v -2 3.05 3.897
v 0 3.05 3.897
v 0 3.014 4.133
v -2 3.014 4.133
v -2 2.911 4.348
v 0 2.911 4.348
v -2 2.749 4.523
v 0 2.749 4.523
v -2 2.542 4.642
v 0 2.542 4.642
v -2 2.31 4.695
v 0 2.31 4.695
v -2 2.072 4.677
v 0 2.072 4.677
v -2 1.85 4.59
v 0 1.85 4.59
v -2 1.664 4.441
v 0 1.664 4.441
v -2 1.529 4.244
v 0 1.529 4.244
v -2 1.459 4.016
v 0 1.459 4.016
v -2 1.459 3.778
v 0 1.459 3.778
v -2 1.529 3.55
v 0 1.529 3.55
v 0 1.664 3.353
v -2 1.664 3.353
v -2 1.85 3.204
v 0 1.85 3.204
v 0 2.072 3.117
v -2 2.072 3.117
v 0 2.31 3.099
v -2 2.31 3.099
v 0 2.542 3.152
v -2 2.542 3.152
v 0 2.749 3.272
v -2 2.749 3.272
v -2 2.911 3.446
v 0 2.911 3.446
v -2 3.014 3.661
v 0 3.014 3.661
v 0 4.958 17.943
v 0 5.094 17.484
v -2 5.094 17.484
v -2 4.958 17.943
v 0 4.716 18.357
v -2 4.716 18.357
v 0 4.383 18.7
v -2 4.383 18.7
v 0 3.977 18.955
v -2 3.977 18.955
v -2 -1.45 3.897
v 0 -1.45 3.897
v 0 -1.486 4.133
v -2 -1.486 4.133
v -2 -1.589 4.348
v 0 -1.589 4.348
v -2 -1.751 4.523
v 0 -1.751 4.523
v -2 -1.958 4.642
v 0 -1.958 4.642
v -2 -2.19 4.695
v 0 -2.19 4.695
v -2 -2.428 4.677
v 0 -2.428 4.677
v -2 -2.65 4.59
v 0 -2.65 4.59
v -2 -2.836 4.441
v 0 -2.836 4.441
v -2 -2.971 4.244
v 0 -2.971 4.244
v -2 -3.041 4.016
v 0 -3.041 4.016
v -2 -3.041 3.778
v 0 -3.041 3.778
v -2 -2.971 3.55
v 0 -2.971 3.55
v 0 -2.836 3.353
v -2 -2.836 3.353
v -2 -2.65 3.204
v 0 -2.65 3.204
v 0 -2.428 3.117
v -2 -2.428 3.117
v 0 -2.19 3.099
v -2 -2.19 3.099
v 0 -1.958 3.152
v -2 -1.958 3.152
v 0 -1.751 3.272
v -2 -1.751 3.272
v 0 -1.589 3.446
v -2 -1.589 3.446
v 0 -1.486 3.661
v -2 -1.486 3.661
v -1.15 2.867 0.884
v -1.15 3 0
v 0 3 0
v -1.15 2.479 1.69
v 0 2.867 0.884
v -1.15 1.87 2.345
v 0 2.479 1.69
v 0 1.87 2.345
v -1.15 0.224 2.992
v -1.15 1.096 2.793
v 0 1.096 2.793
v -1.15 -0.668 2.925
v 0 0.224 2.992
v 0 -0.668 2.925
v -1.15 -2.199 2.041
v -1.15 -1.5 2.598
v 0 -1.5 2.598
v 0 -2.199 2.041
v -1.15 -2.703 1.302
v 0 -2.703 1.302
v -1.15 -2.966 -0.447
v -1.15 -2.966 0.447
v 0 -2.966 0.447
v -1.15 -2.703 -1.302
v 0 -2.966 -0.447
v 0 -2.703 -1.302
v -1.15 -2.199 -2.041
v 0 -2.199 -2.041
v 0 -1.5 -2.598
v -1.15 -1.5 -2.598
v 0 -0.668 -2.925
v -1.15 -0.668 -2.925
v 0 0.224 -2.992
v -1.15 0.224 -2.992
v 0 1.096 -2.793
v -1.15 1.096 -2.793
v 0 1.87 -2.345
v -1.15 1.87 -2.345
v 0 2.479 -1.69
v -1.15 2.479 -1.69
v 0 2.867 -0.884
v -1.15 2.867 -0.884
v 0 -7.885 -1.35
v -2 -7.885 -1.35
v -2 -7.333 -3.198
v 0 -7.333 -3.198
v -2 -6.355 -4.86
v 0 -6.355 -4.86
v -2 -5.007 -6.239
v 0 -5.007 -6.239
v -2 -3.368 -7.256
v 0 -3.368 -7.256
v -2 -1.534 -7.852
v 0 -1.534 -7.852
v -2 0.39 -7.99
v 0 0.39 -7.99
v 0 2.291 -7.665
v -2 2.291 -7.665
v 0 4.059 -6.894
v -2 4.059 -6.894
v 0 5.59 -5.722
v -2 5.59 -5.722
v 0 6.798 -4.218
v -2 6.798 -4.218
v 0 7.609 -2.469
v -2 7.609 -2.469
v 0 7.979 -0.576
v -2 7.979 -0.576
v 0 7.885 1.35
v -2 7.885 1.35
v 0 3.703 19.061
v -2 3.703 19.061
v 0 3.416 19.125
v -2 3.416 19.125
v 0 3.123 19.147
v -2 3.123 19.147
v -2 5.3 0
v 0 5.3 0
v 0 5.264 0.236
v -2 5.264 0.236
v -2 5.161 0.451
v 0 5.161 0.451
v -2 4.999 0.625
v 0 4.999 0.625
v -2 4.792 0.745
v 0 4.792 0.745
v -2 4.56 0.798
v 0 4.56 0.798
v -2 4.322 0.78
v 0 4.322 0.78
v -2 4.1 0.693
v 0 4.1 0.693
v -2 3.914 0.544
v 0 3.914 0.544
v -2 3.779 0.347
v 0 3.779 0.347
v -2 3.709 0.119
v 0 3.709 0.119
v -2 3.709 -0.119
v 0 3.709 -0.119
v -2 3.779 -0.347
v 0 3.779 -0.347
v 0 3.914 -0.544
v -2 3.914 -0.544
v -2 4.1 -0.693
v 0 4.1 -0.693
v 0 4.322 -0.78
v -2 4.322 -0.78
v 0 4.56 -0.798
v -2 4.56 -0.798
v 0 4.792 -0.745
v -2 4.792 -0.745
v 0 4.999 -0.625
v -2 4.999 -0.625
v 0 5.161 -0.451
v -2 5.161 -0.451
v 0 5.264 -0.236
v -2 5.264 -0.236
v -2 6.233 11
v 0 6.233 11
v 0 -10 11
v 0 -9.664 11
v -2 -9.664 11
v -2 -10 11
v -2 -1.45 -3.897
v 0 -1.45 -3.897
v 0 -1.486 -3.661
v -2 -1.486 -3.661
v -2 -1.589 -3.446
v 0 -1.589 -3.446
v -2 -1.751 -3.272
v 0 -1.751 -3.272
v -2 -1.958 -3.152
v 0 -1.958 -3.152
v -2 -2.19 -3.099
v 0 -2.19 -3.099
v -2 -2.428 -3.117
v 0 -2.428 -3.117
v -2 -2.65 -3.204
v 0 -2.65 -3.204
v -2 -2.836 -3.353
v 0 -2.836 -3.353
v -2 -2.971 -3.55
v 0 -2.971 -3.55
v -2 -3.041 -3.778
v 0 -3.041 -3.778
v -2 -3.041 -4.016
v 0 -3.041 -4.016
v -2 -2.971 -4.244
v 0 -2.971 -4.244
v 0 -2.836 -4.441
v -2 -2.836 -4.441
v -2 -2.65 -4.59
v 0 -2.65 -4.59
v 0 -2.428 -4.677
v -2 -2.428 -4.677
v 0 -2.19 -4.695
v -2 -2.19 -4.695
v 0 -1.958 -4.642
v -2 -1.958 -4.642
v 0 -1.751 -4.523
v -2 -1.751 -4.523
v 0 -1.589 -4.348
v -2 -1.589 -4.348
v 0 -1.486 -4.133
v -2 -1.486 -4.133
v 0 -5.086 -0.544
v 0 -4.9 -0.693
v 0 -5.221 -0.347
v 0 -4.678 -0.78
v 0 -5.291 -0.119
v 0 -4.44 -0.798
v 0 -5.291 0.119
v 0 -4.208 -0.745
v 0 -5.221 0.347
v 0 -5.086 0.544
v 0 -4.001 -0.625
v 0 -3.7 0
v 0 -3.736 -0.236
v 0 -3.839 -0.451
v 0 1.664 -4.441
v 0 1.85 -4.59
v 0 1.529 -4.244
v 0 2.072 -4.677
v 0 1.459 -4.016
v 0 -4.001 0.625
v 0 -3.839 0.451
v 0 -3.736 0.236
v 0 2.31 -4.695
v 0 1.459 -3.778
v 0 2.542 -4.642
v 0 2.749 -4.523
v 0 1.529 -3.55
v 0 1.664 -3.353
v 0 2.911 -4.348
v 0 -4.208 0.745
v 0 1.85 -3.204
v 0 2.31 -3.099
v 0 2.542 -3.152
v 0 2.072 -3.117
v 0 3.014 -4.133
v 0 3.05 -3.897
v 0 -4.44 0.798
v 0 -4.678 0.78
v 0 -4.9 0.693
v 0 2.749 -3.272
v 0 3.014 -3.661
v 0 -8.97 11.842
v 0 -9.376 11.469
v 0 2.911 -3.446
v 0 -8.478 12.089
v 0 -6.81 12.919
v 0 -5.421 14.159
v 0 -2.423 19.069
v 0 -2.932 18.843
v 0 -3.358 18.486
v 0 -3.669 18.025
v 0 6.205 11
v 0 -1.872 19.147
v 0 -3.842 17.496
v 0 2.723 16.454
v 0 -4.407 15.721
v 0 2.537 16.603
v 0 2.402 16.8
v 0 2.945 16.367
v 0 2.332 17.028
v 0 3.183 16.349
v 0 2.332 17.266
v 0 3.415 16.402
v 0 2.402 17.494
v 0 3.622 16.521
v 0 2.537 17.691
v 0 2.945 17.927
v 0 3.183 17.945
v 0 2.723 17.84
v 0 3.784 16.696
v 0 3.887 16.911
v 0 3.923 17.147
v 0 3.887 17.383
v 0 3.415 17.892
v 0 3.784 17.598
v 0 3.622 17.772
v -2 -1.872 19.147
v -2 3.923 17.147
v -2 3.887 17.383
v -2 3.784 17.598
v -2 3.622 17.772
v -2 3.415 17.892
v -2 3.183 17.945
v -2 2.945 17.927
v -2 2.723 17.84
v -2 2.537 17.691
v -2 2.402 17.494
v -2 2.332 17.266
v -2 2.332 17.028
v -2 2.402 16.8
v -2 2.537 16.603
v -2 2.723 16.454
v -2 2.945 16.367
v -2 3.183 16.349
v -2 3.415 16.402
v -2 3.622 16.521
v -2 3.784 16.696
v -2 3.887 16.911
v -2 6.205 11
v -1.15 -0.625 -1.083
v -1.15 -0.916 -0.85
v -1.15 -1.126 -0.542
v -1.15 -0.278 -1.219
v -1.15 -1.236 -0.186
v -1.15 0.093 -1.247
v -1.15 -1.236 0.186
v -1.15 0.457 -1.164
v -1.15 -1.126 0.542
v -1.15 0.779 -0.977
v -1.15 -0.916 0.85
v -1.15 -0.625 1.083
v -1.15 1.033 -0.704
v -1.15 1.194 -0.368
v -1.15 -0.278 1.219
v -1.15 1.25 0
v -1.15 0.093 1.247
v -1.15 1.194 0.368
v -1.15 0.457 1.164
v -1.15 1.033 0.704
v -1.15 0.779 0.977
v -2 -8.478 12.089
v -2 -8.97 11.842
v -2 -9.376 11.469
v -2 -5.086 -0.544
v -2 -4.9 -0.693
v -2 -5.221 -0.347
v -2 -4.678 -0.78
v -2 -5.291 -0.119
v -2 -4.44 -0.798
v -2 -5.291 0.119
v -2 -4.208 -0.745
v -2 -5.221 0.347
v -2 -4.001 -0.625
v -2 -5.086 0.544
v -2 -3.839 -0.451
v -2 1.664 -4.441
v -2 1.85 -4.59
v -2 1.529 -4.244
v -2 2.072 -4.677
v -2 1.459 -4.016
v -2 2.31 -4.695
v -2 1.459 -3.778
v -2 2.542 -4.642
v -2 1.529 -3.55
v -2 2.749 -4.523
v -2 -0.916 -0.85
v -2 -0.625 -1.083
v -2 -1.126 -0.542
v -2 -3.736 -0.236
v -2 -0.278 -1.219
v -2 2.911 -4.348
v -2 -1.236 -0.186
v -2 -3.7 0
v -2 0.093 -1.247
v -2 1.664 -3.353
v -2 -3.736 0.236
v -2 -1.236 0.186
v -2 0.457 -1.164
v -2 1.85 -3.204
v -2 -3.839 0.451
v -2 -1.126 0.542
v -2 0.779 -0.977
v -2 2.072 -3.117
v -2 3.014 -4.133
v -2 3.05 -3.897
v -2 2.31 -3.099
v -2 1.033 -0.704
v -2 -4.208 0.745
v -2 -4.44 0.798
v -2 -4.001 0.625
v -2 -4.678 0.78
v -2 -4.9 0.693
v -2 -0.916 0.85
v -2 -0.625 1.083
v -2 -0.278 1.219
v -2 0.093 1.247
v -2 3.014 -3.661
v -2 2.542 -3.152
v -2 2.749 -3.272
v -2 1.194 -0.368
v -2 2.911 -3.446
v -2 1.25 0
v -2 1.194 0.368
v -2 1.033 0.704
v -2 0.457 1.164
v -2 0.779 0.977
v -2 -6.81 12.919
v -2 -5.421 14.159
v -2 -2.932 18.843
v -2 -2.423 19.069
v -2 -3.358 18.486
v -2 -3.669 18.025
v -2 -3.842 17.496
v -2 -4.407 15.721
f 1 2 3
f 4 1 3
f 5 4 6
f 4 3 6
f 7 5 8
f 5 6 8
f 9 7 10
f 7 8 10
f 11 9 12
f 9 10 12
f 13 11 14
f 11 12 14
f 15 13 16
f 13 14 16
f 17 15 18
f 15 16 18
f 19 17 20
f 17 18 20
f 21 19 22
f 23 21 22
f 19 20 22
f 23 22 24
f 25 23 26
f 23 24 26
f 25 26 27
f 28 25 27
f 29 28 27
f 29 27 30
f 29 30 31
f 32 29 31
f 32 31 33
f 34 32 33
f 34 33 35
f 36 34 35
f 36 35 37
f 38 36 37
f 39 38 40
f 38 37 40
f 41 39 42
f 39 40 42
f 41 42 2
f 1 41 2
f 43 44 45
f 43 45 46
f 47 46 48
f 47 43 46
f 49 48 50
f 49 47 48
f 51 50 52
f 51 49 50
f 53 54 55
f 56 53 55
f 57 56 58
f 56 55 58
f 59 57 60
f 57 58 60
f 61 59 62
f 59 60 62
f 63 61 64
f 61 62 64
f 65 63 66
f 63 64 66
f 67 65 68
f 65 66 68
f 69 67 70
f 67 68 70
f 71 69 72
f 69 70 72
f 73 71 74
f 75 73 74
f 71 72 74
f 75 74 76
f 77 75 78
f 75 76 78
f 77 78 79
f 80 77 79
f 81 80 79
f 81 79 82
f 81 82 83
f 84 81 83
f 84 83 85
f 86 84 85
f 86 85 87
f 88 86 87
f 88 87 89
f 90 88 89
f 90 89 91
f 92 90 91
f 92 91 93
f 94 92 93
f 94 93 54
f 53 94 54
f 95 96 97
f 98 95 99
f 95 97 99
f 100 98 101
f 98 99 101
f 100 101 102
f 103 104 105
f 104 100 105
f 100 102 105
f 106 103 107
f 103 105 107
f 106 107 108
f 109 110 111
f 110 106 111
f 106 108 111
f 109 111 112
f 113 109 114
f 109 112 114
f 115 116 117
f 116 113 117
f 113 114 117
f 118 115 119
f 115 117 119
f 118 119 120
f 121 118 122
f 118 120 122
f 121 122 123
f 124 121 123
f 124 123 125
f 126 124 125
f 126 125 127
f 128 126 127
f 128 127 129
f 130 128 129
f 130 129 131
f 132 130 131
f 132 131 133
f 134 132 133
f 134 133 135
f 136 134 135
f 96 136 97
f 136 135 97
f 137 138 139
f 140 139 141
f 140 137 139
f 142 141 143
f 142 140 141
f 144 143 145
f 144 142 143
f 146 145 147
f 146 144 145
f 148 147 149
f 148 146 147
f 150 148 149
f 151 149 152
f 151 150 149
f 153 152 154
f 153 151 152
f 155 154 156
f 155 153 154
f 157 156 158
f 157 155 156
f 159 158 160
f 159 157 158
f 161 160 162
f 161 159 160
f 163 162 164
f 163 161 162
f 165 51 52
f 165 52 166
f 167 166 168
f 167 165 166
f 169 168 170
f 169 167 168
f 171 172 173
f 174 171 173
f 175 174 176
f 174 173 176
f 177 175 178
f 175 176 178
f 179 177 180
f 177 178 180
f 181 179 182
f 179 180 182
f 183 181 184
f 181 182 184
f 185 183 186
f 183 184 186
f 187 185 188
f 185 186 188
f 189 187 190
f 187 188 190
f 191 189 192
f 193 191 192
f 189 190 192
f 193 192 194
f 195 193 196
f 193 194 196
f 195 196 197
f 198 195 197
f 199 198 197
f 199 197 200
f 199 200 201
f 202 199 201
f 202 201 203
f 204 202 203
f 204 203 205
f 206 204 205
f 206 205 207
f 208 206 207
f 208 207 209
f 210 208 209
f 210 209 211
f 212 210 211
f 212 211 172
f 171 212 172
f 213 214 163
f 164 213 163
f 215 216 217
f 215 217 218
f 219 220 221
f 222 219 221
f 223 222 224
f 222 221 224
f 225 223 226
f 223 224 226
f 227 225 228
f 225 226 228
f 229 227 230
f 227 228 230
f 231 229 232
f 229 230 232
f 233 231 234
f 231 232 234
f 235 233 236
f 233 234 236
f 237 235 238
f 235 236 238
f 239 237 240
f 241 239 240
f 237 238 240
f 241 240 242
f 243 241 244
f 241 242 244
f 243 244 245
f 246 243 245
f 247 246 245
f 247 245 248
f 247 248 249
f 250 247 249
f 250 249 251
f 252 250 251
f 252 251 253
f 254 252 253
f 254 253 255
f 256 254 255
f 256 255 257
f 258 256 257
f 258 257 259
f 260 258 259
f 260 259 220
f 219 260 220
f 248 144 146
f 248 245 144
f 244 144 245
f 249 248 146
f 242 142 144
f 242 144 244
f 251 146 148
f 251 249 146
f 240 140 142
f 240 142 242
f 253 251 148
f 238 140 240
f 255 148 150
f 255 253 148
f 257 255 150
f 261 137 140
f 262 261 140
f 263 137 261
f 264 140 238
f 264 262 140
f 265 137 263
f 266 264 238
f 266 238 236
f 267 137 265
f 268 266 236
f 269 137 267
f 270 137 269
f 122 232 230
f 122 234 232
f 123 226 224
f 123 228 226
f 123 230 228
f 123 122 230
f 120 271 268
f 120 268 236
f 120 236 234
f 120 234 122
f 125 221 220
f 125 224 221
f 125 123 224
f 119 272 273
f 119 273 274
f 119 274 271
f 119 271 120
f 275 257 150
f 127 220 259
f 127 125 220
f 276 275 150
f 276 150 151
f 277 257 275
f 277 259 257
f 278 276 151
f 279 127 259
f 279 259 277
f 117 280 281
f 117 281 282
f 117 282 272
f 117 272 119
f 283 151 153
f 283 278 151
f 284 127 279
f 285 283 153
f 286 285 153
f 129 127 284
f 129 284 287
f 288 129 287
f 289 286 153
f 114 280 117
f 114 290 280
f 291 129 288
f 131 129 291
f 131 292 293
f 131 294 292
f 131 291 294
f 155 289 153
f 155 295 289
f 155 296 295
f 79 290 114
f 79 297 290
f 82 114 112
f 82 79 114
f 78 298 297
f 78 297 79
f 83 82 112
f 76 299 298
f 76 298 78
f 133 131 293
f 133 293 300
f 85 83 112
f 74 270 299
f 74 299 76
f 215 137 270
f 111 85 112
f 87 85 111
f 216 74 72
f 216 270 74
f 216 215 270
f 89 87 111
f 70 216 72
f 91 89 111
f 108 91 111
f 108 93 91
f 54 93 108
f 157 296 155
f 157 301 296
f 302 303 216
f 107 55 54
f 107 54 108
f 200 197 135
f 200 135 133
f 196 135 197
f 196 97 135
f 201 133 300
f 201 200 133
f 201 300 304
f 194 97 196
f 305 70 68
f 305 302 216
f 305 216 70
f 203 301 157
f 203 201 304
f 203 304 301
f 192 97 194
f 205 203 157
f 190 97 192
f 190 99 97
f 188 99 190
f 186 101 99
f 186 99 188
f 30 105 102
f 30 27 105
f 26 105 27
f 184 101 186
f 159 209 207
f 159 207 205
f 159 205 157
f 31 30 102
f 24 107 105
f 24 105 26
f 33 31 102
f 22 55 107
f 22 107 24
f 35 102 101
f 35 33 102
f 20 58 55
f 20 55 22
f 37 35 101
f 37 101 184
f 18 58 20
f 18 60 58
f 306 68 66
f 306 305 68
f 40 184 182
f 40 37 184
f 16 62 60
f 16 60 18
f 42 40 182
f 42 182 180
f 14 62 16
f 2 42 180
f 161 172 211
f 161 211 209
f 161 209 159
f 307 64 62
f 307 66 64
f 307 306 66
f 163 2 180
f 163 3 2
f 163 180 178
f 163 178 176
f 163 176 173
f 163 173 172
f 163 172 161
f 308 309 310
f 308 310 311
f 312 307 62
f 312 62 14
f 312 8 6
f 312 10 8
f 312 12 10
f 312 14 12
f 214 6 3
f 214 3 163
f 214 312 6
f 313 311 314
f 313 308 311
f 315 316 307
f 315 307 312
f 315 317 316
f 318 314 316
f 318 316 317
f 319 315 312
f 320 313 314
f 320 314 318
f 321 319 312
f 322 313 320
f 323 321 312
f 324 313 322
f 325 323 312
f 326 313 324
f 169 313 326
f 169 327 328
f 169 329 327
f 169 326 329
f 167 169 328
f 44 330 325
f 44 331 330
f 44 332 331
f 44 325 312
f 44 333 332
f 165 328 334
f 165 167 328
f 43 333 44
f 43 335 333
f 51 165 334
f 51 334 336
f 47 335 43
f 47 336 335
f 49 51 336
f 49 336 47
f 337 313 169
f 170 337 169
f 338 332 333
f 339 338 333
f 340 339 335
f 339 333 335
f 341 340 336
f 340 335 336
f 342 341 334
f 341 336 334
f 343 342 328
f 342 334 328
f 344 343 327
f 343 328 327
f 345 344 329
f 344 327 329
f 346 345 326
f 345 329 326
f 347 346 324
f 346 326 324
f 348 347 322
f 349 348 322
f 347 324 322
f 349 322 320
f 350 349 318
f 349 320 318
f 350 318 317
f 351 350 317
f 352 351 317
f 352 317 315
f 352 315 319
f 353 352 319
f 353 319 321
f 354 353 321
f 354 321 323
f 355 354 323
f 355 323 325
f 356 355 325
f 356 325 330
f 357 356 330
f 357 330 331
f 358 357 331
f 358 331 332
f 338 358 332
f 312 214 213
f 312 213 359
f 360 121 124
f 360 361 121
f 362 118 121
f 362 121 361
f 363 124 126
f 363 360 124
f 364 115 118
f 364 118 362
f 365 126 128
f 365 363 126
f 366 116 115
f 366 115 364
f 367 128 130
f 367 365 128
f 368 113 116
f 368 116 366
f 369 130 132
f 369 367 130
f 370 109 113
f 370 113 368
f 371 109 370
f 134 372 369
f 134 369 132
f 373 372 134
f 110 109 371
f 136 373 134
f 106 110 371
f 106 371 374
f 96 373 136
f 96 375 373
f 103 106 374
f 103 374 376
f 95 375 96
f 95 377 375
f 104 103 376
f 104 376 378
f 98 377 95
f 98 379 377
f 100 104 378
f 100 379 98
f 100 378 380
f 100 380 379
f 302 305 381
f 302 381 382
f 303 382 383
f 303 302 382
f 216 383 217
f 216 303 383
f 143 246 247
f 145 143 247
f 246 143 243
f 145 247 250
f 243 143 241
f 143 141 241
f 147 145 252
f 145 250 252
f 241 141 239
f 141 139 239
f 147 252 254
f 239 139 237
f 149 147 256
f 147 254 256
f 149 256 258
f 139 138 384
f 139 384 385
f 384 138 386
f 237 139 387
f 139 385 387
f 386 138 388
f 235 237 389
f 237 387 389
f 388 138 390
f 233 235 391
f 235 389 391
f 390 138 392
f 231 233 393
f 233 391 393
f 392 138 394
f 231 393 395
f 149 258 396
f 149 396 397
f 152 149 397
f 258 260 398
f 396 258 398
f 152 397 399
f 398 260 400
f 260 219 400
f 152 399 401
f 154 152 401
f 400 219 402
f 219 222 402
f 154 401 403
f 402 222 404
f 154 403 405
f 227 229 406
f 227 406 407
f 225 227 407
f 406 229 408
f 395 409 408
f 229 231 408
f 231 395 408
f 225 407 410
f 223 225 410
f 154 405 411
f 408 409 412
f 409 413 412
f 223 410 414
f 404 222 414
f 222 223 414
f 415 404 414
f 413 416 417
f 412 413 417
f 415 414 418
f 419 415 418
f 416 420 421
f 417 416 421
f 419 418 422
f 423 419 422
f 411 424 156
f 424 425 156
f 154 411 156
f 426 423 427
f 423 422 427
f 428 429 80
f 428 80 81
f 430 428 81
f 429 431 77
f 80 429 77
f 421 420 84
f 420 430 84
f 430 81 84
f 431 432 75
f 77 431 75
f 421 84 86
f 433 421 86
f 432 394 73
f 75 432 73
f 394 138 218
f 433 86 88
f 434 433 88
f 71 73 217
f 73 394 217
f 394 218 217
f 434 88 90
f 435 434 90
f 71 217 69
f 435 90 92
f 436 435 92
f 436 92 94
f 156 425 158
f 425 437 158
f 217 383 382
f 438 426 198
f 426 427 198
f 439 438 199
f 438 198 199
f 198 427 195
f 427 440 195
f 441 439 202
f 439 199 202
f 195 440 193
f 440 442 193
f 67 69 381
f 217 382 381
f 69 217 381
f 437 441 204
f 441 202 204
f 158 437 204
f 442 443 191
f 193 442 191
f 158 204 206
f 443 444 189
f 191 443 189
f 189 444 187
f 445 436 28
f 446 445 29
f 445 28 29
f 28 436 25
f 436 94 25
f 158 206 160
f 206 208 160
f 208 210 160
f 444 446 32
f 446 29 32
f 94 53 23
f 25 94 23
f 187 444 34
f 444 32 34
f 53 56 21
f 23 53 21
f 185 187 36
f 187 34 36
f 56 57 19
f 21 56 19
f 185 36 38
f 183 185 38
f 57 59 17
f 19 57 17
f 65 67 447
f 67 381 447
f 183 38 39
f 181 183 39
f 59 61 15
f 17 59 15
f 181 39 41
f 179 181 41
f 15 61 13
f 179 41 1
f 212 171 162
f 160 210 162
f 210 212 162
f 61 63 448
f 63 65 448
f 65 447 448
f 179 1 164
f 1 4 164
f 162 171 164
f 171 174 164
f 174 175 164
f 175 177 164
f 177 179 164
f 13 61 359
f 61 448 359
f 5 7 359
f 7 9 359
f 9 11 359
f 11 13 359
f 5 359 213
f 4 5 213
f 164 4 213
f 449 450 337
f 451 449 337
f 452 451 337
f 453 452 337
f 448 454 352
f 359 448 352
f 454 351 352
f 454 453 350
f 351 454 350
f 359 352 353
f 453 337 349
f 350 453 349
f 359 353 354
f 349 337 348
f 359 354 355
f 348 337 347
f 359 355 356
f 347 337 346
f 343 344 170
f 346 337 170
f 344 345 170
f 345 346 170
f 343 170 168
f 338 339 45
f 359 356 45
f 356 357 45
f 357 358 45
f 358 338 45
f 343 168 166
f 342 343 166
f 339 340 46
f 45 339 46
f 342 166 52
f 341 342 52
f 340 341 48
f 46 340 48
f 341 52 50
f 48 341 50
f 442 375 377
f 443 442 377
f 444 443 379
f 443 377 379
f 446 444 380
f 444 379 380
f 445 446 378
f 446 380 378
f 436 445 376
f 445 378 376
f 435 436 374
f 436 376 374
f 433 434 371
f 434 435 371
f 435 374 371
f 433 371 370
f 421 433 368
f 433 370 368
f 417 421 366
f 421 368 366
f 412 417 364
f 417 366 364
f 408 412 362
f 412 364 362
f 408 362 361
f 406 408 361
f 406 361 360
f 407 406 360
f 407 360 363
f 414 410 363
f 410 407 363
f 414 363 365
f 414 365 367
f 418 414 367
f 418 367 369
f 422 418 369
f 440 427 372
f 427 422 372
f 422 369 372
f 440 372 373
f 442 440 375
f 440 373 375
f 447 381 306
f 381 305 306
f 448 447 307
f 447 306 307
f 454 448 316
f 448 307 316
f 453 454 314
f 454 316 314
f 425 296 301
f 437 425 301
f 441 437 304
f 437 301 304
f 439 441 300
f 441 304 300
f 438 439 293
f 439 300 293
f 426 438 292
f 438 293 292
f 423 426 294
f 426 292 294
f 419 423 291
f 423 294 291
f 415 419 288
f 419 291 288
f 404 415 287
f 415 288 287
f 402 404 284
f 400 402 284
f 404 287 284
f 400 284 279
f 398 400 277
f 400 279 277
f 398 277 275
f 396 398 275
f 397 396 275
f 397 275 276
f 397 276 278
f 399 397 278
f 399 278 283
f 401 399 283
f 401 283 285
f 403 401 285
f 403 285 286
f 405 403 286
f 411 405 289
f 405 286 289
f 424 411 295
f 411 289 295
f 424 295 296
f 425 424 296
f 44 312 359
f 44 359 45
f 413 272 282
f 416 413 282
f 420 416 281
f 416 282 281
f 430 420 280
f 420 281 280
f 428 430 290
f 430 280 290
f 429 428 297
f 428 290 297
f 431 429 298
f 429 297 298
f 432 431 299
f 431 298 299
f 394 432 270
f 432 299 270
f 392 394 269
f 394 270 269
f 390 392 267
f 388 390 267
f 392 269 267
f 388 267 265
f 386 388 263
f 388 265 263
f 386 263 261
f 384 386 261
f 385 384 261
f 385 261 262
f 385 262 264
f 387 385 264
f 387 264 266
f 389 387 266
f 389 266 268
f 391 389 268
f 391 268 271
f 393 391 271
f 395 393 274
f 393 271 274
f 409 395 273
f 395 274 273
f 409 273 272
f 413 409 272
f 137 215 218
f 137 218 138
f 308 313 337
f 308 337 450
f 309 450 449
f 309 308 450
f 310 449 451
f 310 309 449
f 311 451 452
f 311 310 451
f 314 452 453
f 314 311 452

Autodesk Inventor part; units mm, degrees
ref_plane "YZ Plane" through (0, 0, 0) normal (1, 0, 0) x (0, 1, 0)
ref_plane "XZ Plane" through (0, 0, 0) normal (0, 1, 0) x (-1, 0, 0)
ref_plane "XY Plane" through (0, 0, 0) normal (0, 0, 1) x (1, 0, 0)
sketch "スケッチ1" plane through (0, 0, 0) normal (1, 0, 0) x (0, 1, 0)
  circle A0 centre (0, 0) radius 3
  circle A1 centre (0, 0) radius 4.5 construction
  circle A2 centre (4.5, 0) radius 0.8
  circle A3 centre (2.25, 3.8971) radius 0.8
  circle A4 centre (-2.25, 3.8971) radius 0.8
  circle A5 centre (-4.5, 0) radius 0.8
  circle A6 centre (-2.25, -3.8971) radius 0.8
  circle A7 centre (2.25, -3.8971) radius 0.8
  line L0 (-25.1126, 0) -> (14.9601, 0) projected
  line L1 (6.2329, 11) -> (-10, 11)
  line L2 (-10, 11) -> (-7.8852, -1.3502)
  circle A8 centre (0, 0) radius 1.25
  line L3 (0, 0) -> (-10, 0) construction
  line L4 (-10, 0) -> (-10, 11) construction
  arc A9 (-7.8852, -1.3502) -> (7.8852, 1.3502) centre (0, 0) ccw
  line L5 (6.2329, 11) -> (7.8852, 1.3502)
  line L6 (-13.5106, 12.8383) -> (-10.0642, 11.2105) projected
  line L7 (-10.0642, 11.2105) -> (-7.9495, -1.1398) projected
  arc A10 (-7.9495, -1.1398) -> (7.821, 1.5607) centre (-0.0642, 0.2105) ccw projected
  line L8 (7.821, 1.5607) -> (5.0943, 17.4845) projected
  arc A11 (5.0943, 17.4845) -> (3.9772, 18.9553) centre (3.123, 17.1469) ccw projected
  line L9 (3.9772, 18.9553) -> (-7.9583, 24.593) projected
  arc A12 (-7.9583, 24.593) -> (-13.5106, 12.8383) centre (-10.7344, 18.7156) ccw projected
  circle A13 centre (-0.0642, 0.2105) radius 1 projected
  circle A14 centre (3.123, 17.1469) radius 0.8 projected
  circle A15 centre (-10.7344, 18.7156) radius 3 projected
  arc A16 (-8.4779, 12.0893) -> (-3.8416, 17.4955) centre (-10.7344, 18.7156) ccw
  line L10 (-1.8722, 19.1469) -> (3.123, 19.1469)
  arc A17 (5.0943, 17.4845) -> (3.123, 19.1469) centre (3.123, 17.1469) ccw
  line L11 (-9.8045, 9.8585) -> (-10, 11)
  arc A18 (-1.8722, 19.1469) -> (-3.8416, 17.4955) centre (-1.8722, 17.1469) ccw
  arc A19 (-8.4779, 12.0893) -> (-9.8045, 9.8585) centre (-7.8332, 10.1961) ccw
  point P0 (7.5963, 0)
  point P1 (-10.1271, 11.742)
  point P2 (-3.7477, 19.1469)
  point P3 (-9.6645, 11)
  point P4 (6.2047, 11)
  point P5 (3.9772, 18.9553)
  dimension "d1" = 9
  dimension "d0" = 6
  dimension "d2" = 1.6
  dimension "d5" = 360
  dimension "d8" = 2.5
  dimension "d13" = 8
  dimension "d14" = 10
  dimension "d15" = 11
  dimension "d16" = 7
  dimension "d17" = 2
extrude "押し出し1" add sketch "スケッチ1" against normal blind 2 contours L0 A8 A0 | L0 A2 A10 A9 L2 A5 A0 | A0 L0 A8 | A0 L0 A5 L2 A19 L1 L8 A10 A2 | A10 L8 L1 L5 A9 L0 | L0 A9 A10 | L2 L1 A19 | L1 A19 A16 A18 L10 A17 A11 L8
extrude "押し出し2" cut sketch "スケッチ1" against normal blind 1.15 contours L0 A8 A0 | A0 L0 A8
properties part number "MotorMount"
